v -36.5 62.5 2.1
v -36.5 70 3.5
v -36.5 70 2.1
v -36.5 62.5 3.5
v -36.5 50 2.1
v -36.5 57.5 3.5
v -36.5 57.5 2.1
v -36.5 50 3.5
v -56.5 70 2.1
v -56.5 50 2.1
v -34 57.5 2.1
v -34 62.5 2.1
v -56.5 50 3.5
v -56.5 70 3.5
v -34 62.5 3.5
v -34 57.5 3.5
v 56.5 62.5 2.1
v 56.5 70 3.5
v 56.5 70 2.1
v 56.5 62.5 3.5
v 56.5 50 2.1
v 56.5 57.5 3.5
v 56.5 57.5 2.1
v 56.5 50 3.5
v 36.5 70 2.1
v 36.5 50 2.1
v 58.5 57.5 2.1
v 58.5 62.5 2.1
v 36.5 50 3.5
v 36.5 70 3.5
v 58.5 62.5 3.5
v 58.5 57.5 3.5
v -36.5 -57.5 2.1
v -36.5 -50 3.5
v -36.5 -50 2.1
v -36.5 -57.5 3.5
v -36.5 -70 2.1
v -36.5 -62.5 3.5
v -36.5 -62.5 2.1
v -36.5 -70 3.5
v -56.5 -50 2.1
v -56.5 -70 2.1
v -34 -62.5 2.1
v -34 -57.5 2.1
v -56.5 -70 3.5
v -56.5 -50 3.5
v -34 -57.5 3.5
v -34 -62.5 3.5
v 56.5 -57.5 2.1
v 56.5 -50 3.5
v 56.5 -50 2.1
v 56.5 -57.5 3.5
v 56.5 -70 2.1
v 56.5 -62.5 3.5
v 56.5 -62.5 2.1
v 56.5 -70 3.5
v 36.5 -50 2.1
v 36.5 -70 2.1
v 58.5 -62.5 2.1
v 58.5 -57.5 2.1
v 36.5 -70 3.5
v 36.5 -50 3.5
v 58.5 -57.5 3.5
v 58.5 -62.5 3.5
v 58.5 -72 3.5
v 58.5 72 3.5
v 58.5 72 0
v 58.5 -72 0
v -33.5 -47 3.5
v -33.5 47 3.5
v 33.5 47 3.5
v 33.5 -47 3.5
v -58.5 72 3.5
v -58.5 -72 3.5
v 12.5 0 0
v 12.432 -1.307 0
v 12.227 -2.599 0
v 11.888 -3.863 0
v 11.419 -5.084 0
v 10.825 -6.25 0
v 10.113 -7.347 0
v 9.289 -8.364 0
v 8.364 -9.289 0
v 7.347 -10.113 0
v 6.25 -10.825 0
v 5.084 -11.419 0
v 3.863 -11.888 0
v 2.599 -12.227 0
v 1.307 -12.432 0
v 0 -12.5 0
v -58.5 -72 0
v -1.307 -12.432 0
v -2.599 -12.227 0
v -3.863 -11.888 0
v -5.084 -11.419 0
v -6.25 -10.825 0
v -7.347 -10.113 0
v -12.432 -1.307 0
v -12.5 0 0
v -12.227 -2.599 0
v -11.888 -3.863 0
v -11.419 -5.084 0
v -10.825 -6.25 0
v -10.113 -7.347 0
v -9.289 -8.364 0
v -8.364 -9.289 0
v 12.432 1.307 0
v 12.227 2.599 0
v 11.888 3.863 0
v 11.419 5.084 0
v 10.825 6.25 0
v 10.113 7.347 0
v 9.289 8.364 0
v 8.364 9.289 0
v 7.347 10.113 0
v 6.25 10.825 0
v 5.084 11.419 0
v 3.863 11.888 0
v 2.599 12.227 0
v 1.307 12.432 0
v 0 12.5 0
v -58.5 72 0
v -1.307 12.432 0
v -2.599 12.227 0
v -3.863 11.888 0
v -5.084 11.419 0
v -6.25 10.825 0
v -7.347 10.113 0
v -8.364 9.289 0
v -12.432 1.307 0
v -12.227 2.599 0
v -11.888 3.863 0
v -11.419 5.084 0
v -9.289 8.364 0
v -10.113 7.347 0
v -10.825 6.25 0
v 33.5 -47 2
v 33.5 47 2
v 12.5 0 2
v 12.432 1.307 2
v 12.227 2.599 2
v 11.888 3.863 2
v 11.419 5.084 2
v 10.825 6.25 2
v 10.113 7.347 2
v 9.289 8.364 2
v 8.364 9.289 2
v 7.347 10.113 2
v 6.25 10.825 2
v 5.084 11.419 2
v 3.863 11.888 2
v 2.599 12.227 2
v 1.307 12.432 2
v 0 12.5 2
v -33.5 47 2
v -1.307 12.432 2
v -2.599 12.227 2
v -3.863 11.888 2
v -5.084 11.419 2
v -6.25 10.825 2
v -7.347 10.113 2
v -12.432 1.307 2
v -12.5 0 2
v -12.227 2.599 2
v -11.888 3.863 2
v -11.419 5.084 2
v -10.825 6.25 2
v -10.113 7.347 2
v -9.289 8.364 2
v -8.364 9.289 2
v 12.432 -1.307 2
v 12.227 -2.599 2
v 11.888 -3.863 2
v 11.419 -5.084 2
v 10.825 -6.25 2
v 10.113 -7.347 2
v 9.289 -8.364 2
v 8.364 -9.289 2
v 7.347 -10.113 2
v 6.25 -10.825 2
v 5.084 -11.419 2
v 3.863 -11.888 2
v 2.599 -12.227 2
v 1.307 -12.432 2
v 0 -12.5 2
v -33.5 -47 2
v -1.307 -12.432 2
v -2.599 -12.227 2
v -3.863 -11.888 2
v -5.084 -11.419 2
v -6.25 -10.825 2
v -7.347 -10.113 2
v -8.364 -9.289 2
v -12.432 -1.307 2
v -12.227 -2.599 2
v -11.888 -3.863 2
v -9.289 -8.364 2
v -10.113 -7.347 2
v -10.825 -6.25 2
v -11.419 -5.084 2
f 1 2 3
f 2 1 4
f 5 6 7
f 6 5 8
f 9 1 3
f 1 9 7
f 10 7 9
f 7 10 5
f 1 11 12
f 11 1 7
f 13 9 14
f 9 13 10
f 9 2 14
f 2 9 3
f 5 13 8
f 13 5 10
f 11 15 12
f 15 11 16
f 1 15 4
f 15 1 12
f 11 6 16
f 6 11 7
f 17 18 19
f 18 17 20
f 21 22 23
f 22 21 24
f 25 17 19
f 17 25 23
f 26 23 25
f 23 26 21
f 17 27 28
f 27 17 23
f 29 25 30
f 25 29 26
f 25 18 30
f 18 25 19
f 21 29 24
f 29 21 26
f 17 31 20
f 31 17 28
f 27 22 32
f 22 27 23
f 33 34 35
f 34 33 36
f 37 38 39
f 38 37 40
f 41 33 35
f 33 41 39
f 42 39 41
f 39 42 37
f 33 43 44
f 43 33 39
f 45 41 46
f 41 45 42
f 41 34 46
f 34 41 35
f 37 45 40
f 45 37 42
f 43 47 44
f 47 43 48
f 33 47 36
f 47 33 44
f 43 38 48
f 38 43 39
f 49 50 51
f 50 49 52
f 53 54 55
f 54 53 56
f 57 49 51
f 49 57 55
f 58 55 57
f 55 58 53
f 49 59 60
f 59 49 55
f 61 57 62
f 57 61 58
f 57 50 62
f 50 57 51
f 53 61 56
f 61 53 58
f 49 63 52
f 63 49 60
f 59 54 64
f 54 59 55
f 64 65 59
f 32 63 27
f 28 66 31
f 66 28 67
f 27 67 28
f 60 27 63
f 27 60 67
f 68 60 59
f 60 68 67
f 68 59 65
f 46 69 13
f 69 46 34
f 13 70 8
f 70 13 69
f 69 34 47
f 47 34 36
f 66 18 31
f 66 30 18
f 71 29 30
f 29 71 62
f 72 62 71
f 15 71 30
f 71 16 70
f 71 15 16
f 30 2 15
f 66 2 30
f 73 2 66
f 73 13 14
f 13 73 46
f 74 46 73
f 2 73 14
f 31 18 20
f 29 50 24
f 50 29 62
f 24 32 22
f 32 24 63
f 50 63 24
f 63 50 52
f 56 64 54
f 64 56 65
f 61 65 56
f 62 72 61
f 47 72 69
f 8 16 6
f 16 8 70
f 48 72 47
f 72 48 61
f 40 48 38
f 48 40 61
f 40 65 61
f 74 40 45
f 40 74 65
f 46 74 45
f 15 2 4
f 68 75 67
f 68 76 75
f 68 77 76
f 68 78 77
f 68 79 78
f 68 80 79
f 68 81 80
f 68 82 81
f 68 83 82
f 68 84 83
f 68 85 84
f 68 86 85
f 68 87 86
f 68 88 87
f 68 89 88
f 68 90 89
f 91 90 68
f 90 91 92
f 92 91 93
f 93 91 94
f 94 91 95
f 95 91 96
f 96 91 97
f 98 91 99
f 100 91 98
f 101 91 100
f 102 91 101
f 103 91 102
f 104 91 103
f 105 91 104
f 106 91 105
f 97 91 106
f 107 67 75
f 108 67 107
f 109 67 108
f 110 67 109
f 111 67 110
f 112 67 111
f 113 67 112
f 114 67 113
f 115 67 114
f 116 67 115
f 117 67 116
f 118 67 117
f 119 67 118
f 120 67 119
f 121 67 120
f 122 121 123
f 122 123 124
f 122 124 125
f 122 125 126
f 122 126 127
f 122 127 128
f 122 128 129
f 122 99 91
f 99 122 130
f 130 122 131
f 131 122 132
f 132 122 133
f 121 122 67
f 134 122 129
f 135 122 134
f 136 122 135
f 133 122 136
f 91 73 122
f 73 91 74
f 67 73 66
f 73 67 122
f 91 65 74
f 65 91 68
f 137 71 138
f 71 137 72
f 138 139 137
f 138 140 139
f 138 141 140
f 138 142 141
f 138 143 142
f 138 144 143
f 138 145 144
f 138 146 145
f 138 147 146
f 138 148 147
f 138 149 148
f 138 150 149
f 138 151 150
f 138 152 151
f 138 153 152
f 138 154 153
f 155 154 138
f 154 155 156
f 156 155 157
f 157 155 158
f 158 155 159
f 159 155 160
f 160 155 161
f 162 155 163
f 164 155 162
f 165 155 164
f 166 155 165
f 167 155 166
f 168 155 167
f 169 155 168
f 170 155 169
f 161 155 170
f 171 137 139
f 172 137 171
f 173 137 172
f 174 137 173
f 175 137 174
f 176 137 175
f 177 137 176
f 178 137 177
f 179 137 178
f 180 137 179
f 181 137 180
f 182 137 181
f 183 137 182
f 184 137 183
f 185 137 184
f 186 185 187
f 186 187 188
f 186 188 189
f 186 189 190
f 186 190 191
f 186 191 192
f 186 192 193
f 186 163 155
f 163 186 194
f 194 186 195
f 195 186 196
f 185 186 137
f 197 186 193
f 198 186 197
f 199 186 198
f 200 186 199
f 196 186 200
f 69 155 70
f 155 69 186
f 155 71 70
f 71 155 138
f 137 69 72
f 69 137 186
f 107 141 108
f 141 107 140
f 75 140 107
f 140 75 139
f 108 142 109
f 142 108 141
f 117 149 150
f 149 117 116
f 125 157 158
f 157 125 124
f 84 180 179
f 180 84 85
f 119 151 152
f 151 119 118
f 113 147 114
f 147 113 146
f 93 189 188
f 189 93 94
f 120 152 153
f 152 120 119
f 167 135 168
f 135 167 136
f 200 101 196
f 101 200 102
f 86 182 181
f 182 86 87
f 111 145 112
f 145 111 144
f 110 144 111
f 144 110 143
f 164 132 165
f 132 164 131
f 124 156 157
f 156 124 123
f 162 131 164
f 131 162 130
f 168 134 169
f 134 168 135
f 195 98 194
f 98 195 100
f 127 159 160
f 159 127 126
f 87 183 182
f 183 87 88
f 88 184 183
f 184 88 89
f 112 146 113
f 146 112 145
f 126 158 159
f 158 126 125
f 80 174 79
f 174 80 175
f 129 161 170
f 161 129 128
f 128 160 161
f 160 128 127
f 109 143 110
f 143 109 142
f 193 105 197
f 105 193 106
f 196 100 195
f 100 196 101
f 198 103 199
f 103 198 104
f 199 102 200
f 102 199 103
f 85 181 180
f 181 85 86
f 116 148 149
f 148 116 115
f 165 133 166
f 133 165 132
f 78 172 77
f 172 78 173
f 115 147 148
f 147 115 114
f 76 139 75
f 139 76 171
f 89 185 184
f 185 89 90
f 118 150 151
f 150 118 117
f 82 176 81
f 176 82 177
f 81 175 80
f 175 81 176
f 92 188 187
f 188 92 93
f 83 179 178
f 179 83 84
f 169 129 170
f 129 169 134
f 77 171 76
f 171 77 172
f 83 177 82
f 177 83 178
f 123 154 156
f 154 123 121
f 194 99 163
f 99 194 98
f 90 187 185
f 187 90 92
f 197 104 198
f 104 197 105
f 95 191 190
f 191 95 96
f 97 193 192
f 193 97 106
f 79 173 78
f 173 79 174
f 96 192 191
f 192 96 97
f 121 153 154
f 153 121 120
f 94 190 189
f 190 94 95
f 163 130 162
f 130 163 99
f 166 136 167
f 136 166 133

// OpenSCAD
// --- Pokemon Card Scanning Stage with ArUco Mounts ---
// Units: mm

// --- Parameters ---
// Standard sleeve is ~66x91mm. We add wiggle room.
card_width = 67.0; 
card_height = 94.0;
card_depth = 1.5; // Depth of the card slot
floor_thickness = 2.0; // Thickness of the plastic under the card

// ArUco Marker Settings
marker_size = 20.0; // Size of your paper markers (matches the PDF)
marker_pocket_depth = 0.6; // How deep the paper sits (flush with top)
border_padding = 5.0; // Plastic between card and markers

// Finger hole to push card out
finger_hole_dia = 25.0; 

// --- Derived Calculations ---
total_depth = floor_thickness + card_depth;
// The frame needs to be wide enough to hold the card + borders + markers
frame_width = card_width + (2 * border_padding) + (2 * marker_size);
frame_height = card_height + (2 * border_padding) + (2 * marker_size);

$fn = 60; // Smooth circles

module main_body() {
    difference() {
        // 1. Base Block
        translate([-frame_width/2, -frame_height/2, 0])
        cube([frame_width, frame_height, total_depth]);
        
        // 2. Card Slot (Center)
        translate([-card_width/2, -card_height/2, floor_thickness])
        cube([card_width, card_height, card_depth + 1]); // +1 to ensure cut through top
        
        // 3. Finger Hole (Center)
        translate([0, 0, -1])
        cylinder(h = total_depth + 2, d = finger_hole_dia);
        
        // 4. Marker Pockets (Corners)
        // We calculate positions relative to the frame edges
        
        // Top Left
        translate([
            -frame_width/2 + (marker_size/2) + 2, 
            frame_height/2 - (marker_size/2) - 2, 
            total_depth - marker_pocket_depth
        ])
        marker_cutout();
        
        // Top Right
        translate([
            frame_width/2 - (marker_size/2) - 2, 
            frame_height/2 - (marker_size/2) - 2, 
            total_depth - marker_pocket_depth
        ])
        marker_cutout();
        
        // Bottom Left
        translate([
            -frame_width/2 + (marker_size/2) + 2, 
            -frame_height/2 + (marker_size/2) + 2, 
            total_depth - marker_pocket_depth
        ])
        marker_cutout();
        
        // Bottom Right
        translate([
            frame_width/2 - (marker_size/2) - 2, 
            -frame_height/2 + (marker_size/2) + 2, 
            total_depth - marker_pocket_depth
        ])
        marker_cutout();
    }
}

module marker_cutout() {
    // A square recess for the paper marker
    union() {
        // The square pocket
        cube([marker_size, marker_size, marker_pocket_depth+1], center=true);
        // A tiny finger notch to help remove the sticker if needed (optional)
        translate([marker_size/2, 0, 0])
        cube([5, 5, marker_pocket_depth+1], center=true);
    }
}

// --- Render ---
main_body();
